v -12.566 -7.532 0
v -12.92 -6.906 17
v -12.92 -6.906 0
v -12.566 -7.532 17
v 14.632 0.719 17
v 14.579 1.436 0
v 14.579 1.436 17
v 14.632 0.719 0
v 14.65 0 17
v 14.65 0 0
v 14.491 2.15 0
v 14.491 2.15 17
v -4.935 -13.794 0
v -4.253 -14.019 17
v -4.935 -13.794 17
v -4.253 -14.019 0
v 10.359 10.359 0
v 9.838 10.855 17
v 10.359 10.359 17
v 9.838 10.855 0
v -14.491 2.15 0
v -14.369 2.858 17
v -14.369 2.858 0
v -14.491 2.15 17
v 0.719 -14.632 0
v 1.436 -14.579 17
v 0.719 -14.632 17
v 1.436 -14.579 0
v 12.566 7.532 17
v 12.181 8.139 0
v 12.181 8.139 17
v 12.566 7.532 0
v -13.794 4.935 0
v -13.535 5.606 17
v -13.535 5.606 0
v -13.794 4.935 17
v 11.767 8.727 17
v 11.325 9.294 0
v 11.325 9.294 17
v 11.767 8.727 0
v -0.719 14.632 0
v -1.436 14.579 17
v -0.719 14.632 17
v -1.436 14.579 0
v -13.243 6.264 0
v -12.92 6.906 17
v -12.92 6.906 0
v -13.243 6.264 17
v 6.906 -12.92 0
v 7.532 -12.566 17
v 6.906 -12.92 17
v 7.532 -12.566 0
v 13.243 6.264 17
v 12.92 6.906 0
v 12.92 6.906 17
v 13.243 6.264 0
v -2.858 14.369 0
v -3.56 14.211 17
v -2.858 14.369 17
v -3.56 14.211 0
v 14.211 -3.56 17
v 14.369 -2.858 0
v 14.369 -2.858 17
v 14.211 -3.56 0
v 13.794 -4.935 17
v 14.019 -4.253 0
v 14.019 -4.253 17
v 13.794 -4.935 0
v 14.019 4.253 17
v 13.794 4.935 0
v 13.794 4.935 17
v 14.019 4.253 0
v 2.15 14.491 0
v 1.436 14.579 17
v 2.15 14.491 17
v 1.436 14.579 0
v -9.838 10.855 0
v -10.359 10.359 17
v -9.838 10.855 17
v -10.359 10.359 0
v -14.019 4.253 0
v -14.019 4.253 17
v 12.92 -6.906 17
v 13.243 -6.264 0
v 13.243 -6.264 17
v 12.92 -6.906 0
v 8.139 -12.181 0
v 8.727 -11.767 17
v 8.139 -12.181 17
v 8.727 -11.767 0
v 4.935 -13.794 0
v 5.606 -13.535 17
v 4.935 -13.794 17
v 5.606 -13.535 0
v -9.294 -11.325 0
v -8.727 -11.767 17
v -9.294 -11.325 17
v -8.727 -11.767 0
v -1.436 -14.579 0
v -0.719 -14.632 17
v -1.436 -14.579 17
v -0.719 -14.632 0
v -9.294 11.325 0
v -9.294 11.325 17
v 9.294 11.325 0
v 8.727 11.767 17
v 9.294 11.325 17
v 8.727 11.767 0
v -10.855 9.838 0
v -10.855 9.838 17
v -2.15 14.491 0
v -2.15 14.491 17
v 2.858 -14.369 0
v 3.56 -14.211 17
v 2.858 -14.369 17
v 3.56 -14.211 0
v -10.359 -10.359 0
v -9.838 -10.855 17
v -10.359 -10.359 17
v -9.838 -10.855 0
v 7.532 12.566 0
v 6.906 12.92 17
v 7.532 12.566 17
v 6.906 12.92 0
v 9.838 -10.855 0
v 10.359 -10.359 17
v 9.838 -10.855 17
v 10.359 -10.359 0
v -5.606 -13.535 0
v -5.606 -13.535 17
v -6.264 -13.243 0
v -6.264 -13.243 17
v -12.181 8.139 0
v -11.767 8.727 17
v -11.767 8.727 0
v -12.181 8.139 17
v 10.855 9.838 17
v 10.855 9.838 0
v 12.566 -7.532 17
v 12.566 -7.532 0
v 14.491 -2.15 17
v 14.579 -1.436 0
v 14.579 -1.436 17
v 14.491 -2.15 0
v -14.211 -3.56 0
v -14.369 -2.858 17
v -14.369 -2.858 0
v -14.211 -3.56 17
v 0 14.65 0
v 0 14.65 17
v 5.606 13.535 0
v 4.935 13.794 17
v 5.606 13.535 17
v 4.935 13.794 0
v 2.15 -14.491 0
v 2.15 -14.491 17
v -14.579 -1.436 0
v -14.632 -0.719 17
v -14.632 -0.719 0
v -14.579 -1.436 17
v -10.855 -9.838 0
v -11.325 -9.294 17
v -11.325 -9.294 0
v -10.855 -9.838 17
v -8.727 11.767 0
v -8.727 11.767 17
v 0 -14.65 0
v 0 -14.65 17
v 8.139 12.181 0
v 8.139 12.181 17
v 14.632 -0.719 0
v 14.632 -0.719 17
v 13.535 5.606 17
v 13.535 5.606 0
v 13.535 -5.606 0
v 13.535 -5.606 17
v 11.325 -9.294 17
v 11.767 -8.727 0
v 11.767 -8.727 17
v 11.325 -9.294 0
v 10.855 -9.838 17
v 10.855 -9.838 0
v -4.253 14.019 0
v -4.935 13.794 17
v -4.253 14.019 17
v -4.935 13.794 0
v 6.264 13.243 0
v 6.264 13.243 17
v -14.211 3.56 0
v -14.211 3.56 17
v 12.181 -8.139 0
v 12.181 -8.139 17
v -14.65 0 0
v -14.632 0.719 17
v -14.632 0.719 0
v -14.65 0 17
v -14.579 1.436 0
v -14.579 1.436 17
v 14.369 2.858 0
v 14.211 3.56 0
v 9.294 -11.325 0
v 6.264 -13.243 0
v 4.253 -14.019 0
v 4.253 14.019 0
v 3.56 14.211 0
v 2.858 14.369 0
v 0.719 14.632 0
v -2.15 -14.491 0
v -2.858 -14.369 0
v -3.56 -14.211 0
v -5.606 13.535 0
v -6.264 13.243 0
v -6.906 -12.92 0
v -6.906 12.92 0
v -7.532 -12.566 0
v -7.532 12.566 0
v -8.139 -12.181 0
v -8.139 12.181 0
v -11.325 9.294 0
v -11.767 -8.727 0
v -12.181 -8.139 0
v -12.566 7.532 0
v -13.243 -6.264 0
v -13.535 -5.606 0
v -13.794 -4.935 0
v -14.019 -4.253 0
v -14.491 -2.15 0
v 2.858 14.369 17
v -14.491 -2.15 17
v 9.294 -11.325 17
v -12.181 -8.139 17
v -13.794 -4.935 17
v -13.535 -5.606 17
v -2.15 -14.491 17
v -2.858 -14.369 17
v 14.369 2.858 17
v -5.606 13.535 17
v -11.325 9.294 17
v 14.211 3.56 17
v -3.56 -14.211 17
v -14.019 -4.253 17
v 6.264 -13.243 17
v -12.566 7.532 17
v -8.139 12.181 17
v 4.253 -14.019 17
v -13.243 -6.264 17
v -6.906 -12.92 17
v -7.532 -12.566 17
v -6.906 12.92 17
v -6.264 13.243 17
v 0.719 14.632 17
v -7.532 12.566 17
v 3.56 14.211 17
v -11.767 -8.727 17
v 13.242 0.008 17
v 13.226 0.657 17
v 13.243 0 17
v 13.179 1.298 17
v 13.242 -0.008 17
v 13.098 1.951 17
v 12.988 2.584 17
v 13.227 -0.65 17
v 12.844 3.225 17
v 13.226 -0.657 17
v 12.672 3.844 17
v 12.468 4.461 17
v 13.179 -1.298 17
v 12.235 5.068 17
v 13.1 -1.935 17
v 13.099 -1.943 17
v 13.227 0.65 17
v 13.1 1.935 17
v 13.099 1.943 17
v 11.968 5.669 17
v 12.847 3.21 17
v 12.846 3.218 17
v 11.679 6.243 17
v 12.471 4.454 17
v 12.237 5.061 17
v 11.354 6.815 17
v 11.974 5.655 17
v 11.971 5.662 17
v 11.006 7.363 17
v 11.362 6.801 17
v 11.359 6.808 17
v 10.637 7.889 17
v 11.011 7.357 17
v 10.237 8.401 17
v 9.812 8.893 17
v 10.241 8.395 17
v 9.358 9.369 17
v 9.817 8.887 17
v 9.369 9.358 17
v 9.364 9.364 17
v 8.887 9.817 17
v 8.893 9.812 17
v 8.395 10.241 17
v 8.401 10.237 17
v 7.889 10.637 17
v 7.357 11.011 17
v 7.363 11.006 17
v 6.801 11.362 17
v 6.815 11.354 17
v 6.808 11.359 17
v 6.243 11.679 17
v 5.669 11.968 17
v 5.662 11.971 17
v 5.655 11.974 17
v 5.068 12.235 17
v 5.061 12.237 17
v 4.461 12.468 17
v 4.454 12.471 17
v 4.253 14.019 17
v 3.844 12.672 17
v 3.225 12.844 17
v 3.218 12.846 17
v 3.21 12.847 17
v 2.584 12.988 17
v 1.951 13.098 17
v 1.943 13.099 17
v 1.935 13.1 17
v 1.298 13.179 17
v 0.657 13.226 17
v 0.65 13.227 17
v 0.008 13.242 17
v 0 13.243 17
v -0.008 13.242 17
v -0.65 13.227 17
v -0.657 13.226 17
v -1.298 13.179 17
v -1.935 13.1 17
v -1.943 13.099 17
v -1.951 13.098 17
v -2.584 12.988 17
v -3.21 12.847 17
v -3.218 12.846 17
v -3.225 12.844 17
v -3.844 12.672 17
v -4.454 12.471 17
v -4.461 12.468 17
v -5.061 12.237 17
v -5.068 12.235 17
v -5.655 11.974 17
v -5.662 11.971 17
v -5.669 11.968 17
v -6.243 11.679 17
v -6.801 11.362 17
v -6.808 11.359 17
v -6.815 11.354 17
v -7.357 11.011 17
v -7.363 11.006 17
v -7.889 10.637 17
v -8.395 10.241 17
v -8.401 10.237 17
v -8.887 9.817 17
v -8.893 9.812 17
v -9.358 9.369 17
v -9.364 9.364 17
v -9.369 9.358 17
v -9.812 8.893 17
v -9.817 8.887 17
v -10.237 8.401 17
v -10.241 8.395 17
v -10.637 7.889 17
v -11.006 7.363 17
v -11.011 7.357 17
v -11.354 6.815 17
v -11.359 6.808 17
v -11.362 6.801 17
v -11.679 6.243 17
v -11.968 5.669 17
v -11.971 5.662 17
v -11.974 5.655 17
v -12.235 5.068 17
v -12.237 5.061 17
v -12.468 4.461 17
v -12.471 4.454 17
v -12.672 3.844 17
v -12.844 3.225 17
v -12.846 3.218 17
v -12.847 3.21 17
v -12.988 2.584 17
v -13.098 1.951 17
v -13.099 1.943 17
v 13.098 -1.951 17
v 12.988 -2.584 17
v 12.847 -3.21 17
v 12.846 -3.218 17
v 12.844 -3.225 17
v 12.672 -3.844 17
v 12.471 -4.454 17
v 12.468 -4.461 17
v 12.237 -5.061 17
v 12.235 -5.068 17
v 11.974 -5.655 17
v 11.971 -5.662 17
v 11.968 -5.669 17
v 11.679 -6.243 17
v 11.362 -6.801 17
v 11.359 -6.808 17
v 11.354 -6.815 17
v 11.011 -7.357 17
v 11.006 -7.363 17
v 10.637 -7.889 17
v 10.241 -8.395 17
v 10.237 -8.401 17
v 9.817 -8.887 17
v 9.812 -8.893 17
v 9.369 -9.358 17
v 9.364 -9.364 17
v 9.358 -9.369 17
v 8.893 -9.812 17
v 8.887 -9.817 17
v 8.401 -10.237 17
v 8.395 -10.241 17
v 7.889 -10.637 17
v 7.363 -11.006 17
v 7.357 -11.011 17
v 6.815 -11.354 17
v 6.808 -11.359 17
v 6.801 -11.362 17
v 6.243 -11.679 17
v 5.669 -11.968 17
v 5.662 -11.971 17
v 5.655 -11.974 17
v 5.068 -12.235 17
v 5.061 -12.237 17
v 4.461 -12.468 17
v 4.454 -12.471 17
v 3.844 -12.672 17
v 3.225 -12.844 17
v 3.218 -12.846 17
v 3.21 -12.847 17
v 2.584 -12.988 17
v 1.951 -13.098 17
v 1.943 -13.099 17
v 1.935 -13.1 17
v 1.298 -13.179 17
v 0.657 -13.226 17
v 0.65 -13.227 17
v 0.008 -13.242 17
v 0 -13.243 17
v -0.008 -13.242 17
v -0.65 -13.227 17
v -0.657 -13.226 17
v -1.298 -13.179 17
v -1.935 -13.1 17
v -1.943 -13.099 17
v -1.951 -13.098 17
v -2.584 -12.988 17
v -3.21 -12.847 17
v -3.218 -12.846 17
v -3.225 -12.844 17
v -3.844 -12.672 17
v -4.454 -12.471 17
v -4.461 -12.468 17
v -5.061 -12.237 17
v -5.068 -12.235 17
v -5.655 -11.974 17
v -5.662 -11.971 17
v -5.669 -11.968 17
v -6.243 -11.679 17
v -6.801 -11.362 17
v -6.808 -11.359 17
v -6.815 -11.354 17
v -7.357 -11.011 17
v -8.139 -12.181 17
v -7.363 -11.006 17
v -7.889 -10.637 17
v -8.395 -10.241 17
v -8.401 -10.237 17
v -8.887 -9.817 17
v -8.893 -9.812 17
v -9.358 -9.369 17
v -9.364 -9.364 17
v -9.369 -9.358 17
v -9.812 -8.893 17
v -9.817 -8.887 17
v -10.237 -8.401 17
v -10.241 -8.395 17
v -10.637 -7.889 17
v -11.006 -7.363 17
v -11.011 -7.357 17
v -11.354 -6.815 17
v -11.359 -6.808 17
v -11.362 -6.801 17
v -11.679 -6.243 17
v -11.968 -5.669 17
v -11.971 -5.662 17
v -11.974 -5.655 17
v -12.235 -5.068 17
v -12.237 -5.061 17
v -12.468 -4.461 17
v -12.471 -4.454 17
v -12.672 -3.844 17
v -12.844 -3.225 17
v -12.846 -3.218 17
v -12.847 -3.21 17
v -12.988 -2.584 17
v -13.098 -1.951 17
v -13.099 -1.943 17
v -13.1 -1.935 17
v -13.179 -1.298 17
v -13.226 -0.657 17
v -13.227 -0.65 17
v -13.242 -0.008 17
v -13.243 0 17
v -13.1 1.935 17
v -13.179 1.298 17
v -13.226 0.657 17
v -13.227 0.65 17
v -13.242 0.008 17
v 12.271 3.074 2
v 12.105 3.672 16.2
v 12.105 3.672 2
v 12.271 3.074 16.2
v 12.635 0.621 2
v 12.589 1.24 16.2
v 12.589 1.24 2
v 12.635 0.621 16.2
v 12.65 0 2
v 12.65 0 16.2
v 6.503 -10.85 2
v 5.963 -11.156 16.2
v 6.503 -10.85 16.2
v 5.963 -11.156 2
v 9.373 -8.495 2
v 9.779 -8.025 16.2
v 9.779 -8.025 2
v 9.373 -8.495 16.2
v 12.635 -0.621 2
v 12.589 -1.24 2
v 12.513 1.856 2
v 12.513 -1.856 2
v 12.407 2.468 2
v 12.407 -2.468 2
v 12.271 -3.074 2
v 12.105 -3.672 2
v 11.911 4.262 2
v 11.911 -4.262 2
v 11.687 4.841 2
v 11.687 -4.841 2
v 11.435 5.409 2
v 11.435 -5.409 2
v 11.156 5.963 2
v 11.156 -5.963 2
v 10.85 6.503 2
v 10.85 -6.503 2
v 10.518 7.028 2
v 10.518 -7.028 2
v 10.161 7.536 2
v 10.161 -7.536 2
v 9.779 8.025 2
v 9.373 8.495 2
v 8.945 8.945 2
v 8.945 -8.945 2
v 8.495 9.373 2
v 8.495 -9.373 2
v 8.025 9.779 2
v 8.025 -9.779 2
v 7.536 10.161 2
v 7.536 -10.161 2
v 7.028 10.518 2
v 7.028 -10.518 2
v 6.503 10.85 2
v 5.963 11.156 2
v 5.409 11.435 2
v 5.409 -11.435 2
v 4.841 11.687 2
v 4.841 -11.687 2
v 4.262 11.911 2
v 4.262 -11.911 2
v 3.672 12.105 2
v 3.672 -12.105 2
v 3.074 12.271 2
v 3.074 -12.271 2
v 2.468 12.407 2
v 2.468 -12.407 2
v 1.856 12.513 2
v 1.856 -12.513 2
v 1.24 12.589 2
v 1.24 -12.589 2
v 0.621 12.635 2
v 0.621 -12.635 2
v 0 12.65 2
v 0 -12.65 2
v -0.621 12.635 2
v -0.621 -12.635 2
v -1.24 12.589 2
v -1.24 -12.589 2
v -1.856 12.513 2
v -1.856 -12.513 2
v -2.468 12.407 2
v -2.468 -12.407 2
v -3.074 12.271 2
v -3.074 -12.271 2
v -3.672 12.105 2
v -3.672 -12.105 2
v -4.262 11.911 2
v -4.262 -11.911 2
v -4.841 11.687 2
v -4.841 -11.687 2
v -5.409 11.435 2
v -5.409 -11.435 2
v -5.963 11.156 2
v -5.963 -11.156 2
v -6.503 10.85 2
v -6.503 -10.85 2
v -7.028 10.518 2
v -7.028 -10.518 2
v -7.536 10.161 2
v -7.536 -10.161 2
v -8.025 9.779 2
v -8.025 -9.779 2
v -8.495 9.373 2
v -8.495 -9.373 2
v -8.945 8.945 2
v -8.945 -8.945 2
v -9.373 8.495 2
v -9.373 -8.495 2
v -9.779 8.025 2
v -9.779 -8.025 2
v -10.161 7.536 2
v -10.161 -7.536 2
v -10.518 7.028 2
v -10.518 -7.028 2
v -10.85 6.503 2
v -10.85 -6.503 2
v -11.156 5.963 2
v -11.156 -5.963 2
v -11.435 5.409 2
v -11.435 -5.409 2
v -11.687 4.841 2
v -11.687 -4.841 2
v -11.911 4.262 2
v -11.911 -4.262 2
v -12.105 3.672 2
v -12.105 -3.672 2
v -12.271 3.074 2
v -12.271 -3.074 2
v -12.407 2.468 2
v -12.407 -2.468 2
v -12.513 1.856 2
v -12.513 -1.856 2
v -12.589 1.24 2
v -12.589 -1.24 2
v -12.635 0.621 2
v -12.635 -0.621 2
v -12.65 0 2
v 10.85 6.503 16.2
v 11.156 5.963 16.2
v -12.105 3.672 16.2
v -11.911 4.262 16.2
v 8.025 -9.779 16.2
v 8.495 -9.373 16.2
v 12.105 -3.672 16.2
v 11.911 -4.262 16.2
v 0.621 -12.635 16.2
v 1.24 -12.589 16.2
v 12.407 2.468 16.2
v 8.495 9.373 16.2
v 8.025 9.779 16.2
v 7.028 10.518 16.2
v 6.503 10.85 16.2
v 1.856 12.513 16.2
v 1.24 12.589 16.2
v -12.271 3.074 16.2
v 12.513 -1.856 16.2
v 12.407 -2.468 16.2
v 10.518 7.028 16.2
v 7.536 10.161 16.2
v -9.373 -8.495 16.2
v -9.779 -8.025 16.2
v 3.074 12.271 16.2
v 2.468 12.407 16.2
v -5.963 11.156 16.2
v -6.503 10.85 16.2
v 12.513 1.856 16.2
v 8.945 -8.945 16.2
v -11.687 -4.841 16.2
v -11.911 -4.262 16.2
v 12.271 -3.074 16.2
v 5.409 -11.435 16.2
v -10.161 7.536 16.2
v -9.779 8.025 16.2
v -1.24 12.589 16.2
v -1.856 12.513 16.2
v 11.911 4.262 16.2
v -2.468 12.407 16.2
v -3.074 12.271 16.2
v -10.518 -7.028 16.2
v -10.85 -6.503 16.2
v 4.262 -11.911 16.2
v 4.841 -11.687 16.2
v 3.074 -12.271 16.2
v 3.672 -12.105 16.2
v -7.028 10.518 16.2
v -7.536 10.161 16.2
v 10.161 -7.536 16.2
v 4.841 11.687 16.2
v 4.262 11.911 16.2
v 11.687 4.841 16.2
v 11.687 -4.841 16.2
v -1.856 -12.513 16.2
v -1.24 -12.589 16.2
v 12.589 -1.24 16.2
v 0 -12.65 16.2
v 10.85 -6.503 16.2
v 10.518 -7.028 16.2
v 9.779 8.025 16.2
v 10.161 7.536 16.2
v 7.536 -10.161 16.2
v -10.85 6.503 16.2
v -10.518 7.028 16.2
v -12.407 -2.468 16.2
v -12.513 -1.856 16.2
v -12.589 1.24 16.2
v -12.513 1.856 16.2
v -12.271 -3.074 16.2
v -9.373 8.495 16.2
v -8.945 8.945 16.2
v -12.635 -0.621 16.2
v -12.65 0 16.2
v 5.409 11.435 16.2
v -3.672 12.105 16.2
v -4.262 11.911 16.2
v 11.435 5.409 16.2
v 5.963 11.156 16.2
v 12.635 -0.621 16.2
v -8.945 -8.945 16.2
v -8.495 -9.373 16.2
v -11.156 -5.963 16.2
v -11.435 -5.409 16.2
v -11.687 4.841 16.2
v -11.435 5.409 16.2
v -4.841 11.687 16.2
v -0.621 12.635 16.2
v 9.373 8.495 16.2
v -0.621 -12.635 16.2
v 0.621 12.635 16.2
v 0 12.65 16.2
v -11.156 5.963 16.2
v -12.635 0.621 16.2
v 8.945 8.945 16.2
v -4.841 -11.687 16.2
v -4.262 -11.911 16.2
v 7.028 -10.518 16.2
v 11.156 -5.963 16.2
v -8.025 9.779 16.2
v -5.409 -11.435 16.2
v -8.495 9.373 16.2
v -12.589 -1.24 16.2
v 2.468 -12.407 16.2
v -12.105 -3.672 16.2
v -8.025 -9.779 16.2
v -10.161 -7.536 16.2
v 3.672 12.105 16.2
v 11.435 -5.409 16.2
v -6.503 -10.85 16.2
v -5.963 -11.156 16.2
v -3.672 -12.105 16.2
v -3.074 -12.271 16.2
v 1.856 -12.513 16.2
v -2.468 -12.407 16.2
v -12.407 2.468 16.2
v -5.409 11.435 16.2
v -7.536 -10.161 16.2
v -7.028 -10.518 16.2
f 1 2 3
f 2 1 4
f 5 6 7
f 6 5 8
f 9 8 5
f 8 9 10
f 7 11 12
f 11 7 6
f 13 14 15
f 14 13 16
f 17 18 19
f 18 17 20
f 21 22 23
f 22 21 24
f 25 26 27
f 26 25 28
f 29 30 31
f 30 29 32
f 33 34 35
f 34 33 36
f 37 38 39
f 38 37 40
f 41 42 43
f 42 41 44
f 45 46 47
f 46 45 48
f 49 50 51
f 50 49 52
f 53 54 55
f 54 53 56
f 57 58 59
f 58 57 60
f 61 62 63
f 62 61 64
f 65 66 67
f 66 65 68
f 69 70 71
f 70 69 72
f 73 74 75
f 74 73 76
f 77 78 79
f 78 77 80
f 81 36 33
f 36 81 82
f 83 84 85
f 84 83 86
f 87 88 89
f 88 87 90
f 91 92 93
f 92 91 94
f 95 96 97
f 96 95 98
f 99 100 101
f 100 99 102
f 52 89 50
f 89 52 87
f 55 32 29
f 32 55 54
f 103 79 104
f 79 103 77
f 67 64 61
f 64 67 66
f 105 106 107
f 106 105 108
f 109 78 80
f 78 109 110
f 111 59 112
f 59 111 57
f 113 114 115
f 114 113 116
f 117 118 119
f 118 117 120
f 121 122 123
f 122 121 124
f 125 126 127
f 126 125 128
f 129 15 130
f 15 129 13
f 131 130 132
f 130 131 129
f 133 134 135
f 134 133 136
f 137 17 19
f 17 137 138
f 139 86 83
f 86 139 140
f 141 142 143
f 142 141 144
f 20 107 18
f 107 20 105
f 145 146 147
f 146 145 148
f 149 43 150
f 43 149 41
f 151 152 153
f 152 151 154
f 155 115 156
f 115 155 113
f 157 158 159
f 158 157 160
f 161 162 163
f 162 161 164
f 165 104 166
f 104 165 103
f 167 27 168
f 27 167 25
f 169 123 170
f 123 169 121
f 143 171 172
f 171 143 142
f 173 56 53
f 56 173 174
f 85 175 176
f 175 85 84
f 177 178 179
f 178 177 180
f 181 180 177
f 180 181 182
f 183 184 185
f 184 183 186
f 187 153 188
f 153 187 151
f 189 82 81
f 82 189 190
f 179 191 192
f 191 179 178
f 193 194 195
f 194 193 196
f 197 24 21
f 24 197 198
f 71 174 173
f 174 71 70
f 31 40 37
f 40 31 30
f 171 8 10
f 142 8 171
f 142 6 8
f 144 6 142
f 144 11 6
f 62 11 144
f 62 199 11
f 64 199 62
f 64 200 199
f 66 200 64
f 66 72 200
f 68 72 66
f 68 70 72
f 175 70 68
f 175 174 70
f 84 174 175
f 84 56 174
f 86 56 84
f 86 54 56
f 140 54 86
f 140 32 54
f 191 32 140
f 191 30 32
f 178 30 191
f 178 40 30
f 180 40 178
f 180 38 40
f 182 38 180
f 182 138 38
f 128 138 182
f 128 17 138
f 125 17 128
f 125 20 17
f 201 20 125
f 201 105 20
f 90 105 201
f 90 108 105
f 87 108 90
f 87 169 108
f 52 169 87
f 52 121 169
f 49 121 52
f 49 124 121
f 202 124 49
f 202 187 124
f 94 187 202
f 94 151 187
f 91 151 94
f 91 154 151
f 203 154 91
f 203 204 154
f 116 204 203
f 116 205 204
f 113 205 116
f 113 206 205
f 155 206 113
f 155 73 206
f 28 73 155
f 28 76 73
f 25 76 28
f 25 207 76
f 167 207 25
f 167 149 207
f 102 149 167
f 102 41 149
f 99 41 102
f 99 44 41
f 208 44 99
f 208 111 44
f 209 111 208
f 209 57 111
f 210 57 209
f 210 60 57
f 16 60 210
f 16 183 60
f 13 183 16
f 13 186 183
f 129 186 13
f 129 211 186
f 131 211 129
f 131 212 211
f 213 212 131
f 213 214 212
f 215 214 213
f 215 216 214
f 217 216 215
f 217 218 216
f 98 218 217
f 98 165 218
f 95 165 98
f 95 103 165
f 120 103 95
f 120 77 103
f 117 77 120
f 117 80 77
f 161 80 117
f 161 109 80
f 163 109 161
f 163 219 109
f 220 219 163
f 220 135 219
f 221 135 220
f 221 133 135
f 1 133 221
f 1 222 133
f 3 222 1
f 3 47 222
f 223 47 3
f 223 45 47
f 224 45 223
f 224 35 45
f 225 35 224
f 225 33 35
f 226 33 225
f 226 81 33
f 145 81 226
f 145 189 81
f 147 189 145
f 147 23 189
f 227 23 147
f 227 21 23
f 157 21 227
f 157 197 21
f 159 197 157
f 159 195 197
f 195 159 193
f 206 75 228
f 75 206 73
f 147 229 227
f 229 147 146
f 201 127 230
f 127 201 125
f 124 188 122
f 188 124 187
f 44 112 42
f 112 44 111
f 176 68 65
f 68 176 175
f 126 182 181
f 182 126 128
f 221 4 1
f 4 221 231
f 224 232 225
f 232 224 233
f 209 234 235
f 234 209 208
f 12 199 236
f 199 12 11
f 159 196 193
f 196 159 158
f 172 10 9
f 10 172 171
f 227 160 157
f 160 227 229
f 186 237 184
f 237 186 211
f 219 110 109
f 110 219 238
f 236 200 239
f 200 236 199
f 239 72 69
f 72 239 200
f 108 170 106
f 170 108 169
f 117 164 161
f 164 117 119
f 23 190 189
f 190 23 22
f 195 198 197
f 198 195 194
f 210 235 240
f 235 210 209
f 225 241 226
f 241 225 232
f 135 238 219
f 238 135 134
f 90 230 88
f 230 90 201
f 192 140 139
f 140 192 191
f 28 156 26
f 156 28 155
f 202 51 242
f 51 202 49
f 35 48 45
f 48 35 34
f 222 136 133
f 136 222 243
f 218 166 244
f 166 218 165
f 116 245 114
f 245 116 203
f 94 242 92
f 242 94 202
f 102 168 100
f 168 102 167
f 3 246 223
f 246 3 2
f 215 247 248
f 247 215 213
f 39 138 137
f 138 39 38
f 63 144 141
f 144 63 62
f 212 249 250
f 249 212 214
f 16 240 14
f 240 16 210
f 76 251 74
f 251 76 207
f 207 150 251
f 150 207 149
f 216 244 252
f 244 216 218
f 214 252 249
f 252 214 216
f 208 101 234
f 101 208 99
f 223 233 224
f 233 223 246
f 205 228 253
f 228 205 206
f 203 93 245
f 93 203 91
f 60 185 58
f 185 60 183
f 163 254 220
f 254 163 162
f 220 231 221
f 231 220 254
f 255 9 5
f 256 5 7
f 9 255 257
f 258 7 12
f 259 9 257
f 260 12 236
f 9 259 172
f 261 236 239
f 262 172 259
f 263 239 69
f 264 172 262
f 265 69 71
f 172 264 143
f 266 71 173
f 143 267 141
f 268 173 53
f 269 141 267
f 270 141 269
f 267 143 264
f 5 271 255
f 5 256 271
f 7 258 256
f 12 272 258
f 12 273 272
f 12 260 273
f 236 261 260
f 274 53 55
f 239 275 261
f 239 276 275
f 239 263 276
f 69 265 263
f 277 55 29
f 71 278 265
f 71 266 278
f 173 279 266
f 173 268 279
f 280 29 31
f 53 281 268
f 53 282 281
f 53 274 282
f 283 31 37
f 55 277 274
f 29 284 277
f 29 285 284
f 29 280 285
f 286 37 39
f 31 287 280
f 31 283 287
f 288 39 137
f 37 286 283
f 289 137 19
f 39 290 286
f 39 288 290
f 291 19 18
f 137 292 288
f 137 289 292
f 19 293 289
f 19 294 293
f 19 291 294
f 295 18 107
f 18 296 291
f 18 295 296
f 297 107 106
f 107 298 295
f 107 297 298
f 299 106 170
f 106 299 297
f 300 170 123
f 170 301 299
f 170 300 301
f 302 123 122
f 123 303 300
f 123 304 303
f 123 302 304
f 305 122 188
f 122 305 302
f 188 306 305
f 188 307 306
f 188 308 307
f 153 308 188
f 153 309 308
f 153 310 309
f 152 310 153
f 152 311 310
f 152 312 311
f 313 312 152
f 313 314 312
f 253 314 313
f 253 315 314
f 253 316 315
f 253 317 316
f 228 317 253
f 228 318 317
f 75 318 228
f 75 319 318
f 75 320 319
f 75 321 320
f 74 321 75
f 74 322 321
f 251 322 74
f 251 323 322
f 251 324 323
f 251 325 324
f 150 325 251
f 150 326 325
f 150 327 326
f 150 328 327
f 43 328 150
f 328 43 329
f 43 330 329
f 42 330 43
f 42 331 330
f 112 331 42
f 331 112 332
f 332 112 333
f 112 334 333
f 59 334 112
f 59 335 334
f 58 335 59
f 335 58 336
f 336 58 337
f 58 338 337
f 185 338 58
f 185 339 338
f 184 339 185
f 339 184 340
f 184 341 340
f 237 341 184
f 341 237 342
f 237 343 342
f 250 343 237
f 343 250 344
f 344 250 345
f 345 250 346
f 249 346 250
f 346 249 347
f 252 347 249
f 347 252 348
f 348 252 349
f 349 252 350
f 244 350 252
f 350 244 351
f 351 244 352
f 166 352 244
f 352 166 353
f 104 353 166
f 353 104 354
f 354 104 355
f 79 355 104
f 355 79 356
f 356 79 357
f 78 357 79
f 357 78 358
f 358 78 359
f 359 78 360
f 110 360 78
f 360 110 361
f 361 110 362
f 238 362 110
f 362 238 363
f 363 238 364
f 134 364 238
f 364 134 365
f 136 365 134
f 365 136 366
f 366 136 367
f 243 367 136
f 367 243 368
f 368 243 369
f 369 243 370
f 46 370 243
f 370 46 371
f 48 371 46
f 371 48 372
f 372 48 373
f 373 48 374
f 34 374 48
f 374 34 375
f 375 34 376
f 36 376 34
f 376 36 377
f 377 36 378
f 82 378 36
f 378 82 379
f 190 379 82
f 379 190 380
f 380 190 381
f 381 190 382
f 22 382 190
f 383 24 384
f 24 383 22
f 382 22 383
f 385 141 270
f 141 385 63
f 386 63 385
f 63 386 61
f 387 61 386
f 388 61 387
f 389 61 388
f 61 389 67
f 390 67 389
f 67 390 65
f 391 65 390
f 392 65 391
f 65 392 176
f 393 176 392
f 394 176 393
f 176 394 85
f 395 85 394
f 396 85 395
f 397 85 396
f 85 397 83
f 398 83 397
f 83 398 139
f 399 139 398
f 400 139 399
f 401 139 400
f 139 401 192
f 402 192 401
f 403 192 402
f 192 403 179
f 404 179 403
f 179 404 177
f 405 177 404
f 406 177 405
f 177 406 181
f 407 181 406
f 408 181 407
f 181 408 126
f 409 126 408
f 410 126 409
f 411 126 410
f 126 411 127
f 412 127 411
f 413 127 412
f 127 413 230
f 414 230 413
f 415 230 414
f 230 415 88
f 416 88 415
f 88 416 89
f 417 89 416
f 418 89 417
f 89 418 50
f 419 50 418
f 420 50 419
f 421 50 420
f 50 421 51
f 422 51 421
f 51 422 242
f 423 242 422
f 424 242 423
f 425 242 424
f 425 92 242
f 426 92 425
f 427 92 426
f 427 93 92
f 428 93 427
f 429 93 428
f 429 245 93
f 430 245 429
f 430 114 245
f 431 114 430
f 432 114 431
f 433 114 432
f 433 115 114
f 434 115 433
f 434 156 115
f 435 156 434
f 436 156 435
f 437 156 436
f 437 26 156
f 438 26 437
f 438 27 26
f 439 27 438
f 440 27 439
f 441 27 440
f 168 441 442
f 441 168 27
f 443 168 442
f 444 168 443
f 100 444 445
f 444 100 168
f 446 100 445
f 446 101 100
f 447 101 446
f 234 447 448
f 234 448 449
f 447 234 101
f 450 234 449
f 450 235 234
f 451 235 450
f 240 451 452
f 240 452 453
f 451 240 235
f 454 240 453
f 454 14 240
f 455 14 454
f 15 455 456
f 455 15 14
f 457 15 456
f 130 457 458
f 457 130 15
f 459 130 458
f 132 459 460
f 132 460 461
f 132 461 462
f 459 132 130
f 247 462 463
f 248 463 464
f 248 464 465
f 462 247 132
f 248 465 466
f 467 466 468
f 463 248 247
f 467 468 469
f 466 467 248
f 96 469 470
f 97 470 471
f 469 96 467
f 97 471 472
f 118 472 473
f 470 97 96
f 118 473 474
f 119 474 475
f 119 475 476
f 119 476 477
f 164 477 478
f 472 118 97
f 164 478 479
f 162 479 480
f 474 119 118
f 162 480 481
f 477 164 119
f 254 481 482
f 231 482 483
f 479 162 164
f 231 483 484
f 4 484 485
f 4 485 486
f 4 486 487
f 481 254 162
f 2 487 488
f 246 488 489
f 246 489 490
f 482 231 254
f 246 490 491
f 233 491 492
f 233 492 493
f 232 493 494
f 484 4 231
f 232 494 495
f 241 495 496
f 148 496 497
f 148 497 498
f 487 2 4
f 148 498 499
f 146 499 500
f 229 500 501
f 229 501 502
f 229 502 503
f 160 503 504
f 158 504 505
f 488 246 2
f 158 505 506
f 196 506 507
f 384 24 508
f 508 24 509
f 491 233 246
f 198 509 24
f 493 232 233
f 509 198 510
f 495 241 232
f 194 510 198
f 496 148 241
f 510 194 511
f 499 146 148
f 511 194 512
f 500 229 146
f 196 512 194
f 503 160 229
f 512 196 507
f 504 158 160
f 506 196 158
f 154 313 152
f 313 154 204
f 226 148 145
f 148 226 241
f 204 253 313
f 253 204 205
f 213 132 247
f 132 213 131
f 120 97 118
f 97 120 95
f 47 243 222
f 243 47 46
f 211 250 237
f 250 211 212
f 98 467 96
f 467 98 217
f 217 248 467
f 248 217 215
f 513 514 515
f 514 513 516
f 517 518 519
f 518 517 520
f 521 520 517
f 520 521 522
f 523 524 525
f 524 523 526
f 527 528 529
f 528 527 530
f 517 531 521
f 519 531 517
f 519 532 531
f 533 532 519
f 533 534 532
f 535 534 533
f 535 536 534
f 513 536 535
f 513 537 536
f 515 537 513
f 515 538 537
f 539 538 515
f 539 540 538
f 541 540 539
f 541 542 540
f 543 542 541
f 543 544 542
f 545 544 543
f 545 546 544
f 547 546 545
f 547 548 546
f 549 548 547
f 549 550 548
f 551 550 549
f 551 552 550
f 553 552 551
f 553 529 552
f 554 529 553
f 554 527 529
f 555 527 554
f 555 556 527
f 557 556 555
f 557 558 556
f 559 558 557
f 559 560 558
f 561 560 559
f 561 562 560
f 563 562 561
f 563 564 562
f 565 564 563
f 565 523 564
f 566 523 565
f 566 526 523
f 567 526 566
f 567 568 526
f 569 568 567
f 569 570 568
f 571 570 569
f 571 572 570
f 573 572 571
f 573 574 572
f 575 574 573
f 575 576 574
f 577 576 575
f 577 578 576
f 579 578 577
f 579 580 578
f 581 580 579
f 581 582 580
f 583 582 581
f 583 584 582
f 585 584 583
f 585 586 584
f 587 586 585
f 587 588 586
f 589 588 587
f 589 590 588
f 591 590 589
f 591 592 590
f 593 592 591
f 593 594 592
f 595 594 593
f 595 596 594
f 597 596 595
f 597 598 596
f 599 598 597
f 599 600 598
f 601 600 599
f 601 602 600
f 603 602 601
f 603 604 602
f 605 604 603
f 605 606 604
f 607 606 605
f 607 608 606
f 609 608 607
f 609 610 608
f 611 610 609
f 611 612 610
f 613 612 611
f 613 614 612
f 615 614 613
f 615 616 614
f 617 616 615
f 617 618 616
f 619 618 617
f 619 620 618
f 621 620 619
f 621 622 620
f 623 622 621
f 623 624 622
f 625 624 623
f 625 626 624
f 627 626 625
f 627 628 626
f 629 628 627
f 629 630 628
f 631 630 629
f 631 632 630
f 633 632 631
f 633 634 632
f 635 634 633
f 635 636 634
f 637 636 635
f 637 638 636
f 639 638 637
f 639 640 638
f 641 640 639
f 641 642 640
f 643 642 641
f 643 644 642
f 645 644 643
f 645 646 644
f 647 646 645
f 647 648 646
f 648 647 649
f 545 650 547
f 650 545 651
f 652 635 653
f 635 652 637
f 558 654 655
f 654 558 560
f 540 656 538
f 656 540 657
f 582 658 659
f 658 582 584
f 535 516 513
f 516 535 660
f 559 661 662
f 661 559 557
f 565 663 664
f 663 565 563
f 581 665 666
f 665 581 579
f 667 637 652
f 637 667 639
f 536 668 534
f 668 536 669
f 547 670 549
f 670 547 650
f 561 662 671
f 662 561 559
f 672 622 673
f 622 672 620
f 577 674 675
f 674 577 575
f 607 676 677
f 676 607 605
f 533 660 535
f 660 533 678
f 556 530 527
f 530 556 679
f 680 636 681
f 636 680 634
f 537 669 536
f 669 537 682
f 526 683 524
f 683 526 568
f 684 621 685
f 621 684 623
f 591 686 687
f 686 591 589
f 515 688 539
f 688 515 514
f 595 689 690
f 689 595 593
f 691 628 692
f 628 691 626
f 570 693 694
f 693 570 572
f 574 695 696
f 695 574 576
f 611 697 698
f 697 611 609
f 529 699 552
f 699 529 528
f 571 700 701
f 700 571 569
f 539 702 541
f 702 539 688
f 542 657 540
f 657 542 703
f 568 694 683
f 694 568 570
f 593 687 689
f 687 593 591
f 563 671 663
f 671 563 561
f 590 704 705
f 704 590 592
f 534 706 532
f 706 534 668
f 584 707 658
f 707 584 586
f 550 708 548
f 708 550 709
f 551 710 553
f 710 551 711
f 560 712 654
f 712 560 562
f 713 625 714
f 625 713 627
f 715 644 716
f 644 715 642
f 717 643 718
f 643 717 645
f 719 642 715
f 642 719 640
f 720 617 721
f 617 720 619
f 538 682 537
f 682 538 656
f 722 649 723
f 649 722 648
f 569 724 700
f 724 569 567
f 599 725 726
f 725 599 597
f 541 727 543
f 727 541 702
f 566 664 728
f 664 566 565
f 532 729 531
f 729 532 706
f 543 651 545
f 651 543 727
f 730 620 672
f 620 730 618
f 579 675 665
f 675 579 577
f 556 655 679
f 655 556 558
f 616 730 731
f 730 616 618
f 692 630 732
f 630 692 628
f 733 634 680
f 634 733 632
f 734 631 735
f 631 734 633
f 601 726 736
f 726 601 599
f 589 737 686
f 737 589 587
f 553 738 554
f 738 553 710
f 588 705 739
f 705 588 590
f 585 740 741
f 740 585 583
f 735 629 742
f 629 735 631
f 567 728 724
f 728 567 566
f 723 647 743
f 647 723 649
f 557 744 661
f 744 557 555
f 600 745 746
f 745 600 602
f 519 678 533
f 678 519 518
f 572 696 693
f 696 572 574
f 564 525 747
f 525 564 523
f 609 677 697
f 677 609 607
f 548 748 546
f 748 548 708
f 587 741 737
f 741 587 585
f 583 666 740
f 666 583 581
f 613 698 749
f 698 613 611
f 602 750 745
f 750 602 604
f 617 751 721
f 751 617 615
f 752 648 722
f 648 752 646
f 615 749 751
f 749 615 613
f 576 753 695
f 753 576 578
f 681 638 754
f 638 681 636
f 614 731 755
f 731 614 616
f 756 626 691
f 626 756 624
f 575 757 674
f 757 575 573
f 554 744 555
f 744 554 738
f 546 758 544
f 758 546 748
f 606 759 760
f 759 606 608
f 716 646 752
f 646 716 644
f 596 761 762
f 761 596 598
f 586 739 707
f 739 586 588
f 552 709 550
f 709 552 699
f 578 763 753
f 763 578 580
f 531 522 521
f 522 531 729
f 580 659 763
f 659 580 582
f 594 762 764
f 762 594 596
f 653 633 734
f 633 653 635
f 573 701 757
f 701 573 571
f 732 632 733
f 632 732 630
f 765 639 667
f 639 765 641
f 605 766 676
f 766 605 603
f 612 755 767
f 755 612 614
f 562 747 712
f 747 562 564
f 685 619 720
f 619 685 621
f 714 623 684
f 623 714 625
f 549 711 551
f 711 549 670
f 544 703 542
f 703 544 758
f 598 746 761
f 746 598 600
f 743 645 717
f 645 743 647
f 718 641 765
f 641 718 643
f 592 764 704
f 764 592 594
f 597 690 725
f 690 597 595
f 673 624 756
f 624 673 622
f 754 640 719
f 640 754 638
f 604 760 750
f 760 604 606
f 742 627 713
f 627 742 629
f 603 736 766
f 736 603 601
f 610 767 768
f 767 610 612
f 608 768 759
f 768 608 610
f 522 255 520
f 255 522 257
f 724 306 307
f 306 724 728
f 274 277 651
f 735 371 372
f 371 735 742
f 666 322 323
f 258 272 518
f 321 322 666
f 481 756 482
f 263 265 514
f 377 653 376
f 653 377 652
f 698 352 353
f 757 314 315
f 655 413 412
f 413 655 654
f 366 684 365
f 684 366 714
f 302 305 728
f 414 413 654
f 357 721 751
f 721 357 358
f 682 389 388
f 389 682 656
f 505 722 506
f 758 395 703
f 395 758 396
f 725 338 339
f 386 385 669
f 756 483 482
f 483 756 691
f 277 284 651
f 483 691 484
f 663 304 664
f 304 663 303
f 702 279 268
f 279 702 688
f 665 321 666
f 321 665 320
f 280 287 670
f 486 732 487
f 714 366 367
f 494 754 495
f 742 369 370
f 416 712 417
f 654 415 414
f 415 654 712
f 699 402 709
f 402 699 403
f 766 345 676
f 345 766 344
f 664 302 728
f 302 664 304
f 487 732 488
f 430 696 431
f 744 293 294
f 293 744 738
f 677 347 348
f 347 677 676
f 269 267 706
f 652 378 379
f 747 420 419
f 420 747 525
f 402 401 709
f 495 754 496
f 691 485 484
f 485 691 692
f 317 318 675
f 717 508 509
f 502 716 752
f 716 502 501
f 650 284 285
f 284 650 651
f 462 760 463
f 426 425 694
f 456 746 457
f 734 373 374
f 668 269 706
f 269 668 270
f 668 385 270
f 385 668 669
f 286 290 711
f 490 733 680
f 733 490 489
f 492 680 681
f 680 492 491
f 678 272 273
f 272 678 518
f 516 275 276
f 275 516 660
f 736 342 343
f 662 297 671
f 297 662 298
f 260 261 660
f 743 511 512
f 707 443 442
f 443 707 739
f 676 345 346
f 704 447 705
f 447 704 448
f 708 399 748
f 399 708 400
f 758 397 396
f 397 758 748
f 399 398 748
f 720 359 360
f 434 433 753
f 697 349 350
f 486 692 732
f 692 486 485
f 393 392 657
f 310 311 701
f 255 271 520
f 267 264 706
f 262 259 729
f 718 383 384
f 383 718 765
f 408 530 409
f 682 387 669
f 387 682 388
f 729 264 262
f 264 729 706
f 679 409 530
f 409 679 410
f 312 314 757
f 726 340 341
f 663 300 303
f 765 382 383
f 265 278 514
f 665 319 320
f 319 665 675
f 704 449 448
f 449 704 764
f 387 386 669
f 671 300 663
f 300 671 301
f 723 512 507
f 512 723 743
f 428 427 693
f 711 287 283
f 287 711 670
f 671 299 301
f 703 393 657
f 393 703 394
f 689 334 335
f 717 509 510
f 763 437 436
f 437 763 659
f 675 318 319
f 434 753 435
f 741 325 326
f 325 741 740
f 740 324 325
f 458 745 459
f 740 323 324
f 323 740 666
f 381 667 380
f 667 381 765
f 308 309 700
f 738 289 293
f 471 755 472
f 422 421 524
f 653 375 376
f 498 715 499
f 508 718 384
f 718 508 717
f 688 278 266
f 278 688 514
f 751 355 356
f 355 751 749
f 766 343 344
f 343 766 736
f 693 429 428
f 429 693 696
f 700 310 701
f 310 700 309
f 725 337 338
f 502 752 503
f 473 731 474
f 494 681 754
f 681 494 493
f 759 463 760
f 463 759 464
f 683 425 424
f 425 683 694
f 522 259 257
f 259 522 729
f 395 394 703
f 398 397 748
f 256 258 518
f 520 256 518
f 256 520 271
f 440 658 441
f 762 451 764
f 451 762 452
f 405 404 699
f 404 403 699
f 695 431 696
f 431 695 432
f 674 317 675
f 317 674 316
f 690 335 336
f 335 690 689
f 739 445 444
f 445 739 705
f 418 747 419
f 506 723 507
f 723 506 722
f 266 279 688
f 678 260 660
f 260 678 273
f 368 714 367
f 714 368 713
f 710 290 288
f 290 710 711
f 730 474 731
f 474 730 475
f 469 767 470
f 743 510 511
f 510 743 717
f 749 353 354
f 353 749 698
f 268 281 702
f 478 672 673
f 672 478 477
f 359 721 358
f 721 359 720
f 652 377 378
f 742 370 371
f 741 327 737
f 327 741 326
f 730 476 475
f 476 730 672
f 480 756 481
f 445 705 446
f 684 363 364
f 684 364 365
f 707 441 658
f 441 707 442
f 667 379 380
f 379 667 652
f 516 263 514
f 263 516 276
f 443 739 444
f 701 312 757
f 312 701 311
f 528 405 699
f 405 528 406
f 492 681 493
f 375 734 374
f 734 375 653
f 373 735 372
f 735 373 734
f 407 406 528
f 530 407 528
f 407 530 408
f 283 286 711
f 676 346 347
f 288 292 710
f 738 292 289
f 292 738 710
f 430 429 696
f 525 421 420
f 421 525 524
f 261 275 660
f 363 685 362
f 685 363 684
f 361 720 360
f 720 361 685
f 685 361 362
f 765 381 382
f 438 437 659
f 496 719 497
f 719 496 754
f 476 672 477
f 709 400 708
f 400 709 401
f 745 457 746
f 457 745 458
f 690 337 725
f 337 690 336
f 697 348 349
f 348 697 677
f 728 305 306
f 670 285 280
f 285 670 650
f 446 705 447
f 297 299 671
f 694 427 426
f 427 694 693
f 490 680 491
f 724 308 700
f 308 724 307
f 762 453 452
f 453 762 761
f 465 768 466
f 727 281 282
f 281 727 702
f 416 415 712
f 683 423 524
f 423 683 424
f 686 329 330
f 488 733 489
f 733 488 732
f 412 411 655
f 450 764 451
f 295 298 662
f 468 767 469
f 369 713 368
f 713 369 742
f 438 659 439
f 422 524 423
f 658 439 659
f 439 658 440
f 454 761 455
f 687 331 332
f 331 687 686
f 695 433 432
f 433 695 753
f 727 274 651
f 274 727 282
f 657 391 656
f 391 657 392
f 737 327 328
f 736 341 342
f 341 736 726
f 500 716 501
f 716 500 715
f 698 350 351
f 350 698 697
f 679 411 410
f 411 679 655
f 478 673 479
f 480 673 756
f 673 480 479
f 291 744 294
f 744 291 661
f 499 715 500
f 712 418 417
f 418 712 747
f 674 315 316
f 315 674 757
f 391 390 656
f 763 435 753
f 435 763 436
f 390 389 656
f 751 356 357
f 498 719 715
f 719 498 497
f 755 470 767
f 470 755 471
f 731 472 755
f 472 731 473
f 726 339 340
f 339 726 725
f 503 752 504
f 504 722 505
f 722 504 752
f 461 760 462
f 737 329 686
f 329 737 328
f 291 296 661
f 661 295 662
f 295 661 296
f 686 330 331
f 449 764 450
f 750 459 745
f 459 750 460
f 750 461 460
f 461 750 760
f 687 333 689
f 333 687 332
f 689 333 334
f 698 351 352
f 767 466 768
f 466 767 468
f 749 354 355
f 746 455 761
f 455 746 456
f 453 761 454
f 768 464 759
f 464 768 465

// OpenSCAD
// Pipe end cap
// Hope Arising EPICS team (ASU) - original design. License: CC BY 4.0 (commercial use allowed).
// Slides over the end of a pipe, tube, furniture leg or rod to cover it.
// NOT for water pressure: it covers and protects, it does not seal a pressurised line.
// Prints closed end down, no supports.

/* [Size] */
// Outside diameter of the pipe or leg it fits over
pipe_diameter = 25;       // [5:0.5:110]
// How far the cap slides onto the pipe
cap_depth = 15;           // [5:1:50]
// Thickness of the cap's side and end
wall_thickness = 2;       // [1.2:0.2:5]

/* [Hidden] */
$fn = 128;
fit_clearance = 0.3;      // snug push fit

module pipe_end_cap() {
    id = pipe_diameter + fit_clearance;
    od = id + 2 * wall_thickness;
    difference() {
        cylinder(h = cap_depth + wall_thickness, d = od);
        translate([0, 0, wall_thickness]) cylinder(h = cap_depth + 1, d = id);
        // small lead-in chamfer at the open end so it starts onto the pipe easily
        translate([0, 0, cap_depth + wall_thickness - 0.8])
            cylinder(h = 0.81, d1 = id, d2 = id + 1.2);
    }
}

pipe_end_cap();
